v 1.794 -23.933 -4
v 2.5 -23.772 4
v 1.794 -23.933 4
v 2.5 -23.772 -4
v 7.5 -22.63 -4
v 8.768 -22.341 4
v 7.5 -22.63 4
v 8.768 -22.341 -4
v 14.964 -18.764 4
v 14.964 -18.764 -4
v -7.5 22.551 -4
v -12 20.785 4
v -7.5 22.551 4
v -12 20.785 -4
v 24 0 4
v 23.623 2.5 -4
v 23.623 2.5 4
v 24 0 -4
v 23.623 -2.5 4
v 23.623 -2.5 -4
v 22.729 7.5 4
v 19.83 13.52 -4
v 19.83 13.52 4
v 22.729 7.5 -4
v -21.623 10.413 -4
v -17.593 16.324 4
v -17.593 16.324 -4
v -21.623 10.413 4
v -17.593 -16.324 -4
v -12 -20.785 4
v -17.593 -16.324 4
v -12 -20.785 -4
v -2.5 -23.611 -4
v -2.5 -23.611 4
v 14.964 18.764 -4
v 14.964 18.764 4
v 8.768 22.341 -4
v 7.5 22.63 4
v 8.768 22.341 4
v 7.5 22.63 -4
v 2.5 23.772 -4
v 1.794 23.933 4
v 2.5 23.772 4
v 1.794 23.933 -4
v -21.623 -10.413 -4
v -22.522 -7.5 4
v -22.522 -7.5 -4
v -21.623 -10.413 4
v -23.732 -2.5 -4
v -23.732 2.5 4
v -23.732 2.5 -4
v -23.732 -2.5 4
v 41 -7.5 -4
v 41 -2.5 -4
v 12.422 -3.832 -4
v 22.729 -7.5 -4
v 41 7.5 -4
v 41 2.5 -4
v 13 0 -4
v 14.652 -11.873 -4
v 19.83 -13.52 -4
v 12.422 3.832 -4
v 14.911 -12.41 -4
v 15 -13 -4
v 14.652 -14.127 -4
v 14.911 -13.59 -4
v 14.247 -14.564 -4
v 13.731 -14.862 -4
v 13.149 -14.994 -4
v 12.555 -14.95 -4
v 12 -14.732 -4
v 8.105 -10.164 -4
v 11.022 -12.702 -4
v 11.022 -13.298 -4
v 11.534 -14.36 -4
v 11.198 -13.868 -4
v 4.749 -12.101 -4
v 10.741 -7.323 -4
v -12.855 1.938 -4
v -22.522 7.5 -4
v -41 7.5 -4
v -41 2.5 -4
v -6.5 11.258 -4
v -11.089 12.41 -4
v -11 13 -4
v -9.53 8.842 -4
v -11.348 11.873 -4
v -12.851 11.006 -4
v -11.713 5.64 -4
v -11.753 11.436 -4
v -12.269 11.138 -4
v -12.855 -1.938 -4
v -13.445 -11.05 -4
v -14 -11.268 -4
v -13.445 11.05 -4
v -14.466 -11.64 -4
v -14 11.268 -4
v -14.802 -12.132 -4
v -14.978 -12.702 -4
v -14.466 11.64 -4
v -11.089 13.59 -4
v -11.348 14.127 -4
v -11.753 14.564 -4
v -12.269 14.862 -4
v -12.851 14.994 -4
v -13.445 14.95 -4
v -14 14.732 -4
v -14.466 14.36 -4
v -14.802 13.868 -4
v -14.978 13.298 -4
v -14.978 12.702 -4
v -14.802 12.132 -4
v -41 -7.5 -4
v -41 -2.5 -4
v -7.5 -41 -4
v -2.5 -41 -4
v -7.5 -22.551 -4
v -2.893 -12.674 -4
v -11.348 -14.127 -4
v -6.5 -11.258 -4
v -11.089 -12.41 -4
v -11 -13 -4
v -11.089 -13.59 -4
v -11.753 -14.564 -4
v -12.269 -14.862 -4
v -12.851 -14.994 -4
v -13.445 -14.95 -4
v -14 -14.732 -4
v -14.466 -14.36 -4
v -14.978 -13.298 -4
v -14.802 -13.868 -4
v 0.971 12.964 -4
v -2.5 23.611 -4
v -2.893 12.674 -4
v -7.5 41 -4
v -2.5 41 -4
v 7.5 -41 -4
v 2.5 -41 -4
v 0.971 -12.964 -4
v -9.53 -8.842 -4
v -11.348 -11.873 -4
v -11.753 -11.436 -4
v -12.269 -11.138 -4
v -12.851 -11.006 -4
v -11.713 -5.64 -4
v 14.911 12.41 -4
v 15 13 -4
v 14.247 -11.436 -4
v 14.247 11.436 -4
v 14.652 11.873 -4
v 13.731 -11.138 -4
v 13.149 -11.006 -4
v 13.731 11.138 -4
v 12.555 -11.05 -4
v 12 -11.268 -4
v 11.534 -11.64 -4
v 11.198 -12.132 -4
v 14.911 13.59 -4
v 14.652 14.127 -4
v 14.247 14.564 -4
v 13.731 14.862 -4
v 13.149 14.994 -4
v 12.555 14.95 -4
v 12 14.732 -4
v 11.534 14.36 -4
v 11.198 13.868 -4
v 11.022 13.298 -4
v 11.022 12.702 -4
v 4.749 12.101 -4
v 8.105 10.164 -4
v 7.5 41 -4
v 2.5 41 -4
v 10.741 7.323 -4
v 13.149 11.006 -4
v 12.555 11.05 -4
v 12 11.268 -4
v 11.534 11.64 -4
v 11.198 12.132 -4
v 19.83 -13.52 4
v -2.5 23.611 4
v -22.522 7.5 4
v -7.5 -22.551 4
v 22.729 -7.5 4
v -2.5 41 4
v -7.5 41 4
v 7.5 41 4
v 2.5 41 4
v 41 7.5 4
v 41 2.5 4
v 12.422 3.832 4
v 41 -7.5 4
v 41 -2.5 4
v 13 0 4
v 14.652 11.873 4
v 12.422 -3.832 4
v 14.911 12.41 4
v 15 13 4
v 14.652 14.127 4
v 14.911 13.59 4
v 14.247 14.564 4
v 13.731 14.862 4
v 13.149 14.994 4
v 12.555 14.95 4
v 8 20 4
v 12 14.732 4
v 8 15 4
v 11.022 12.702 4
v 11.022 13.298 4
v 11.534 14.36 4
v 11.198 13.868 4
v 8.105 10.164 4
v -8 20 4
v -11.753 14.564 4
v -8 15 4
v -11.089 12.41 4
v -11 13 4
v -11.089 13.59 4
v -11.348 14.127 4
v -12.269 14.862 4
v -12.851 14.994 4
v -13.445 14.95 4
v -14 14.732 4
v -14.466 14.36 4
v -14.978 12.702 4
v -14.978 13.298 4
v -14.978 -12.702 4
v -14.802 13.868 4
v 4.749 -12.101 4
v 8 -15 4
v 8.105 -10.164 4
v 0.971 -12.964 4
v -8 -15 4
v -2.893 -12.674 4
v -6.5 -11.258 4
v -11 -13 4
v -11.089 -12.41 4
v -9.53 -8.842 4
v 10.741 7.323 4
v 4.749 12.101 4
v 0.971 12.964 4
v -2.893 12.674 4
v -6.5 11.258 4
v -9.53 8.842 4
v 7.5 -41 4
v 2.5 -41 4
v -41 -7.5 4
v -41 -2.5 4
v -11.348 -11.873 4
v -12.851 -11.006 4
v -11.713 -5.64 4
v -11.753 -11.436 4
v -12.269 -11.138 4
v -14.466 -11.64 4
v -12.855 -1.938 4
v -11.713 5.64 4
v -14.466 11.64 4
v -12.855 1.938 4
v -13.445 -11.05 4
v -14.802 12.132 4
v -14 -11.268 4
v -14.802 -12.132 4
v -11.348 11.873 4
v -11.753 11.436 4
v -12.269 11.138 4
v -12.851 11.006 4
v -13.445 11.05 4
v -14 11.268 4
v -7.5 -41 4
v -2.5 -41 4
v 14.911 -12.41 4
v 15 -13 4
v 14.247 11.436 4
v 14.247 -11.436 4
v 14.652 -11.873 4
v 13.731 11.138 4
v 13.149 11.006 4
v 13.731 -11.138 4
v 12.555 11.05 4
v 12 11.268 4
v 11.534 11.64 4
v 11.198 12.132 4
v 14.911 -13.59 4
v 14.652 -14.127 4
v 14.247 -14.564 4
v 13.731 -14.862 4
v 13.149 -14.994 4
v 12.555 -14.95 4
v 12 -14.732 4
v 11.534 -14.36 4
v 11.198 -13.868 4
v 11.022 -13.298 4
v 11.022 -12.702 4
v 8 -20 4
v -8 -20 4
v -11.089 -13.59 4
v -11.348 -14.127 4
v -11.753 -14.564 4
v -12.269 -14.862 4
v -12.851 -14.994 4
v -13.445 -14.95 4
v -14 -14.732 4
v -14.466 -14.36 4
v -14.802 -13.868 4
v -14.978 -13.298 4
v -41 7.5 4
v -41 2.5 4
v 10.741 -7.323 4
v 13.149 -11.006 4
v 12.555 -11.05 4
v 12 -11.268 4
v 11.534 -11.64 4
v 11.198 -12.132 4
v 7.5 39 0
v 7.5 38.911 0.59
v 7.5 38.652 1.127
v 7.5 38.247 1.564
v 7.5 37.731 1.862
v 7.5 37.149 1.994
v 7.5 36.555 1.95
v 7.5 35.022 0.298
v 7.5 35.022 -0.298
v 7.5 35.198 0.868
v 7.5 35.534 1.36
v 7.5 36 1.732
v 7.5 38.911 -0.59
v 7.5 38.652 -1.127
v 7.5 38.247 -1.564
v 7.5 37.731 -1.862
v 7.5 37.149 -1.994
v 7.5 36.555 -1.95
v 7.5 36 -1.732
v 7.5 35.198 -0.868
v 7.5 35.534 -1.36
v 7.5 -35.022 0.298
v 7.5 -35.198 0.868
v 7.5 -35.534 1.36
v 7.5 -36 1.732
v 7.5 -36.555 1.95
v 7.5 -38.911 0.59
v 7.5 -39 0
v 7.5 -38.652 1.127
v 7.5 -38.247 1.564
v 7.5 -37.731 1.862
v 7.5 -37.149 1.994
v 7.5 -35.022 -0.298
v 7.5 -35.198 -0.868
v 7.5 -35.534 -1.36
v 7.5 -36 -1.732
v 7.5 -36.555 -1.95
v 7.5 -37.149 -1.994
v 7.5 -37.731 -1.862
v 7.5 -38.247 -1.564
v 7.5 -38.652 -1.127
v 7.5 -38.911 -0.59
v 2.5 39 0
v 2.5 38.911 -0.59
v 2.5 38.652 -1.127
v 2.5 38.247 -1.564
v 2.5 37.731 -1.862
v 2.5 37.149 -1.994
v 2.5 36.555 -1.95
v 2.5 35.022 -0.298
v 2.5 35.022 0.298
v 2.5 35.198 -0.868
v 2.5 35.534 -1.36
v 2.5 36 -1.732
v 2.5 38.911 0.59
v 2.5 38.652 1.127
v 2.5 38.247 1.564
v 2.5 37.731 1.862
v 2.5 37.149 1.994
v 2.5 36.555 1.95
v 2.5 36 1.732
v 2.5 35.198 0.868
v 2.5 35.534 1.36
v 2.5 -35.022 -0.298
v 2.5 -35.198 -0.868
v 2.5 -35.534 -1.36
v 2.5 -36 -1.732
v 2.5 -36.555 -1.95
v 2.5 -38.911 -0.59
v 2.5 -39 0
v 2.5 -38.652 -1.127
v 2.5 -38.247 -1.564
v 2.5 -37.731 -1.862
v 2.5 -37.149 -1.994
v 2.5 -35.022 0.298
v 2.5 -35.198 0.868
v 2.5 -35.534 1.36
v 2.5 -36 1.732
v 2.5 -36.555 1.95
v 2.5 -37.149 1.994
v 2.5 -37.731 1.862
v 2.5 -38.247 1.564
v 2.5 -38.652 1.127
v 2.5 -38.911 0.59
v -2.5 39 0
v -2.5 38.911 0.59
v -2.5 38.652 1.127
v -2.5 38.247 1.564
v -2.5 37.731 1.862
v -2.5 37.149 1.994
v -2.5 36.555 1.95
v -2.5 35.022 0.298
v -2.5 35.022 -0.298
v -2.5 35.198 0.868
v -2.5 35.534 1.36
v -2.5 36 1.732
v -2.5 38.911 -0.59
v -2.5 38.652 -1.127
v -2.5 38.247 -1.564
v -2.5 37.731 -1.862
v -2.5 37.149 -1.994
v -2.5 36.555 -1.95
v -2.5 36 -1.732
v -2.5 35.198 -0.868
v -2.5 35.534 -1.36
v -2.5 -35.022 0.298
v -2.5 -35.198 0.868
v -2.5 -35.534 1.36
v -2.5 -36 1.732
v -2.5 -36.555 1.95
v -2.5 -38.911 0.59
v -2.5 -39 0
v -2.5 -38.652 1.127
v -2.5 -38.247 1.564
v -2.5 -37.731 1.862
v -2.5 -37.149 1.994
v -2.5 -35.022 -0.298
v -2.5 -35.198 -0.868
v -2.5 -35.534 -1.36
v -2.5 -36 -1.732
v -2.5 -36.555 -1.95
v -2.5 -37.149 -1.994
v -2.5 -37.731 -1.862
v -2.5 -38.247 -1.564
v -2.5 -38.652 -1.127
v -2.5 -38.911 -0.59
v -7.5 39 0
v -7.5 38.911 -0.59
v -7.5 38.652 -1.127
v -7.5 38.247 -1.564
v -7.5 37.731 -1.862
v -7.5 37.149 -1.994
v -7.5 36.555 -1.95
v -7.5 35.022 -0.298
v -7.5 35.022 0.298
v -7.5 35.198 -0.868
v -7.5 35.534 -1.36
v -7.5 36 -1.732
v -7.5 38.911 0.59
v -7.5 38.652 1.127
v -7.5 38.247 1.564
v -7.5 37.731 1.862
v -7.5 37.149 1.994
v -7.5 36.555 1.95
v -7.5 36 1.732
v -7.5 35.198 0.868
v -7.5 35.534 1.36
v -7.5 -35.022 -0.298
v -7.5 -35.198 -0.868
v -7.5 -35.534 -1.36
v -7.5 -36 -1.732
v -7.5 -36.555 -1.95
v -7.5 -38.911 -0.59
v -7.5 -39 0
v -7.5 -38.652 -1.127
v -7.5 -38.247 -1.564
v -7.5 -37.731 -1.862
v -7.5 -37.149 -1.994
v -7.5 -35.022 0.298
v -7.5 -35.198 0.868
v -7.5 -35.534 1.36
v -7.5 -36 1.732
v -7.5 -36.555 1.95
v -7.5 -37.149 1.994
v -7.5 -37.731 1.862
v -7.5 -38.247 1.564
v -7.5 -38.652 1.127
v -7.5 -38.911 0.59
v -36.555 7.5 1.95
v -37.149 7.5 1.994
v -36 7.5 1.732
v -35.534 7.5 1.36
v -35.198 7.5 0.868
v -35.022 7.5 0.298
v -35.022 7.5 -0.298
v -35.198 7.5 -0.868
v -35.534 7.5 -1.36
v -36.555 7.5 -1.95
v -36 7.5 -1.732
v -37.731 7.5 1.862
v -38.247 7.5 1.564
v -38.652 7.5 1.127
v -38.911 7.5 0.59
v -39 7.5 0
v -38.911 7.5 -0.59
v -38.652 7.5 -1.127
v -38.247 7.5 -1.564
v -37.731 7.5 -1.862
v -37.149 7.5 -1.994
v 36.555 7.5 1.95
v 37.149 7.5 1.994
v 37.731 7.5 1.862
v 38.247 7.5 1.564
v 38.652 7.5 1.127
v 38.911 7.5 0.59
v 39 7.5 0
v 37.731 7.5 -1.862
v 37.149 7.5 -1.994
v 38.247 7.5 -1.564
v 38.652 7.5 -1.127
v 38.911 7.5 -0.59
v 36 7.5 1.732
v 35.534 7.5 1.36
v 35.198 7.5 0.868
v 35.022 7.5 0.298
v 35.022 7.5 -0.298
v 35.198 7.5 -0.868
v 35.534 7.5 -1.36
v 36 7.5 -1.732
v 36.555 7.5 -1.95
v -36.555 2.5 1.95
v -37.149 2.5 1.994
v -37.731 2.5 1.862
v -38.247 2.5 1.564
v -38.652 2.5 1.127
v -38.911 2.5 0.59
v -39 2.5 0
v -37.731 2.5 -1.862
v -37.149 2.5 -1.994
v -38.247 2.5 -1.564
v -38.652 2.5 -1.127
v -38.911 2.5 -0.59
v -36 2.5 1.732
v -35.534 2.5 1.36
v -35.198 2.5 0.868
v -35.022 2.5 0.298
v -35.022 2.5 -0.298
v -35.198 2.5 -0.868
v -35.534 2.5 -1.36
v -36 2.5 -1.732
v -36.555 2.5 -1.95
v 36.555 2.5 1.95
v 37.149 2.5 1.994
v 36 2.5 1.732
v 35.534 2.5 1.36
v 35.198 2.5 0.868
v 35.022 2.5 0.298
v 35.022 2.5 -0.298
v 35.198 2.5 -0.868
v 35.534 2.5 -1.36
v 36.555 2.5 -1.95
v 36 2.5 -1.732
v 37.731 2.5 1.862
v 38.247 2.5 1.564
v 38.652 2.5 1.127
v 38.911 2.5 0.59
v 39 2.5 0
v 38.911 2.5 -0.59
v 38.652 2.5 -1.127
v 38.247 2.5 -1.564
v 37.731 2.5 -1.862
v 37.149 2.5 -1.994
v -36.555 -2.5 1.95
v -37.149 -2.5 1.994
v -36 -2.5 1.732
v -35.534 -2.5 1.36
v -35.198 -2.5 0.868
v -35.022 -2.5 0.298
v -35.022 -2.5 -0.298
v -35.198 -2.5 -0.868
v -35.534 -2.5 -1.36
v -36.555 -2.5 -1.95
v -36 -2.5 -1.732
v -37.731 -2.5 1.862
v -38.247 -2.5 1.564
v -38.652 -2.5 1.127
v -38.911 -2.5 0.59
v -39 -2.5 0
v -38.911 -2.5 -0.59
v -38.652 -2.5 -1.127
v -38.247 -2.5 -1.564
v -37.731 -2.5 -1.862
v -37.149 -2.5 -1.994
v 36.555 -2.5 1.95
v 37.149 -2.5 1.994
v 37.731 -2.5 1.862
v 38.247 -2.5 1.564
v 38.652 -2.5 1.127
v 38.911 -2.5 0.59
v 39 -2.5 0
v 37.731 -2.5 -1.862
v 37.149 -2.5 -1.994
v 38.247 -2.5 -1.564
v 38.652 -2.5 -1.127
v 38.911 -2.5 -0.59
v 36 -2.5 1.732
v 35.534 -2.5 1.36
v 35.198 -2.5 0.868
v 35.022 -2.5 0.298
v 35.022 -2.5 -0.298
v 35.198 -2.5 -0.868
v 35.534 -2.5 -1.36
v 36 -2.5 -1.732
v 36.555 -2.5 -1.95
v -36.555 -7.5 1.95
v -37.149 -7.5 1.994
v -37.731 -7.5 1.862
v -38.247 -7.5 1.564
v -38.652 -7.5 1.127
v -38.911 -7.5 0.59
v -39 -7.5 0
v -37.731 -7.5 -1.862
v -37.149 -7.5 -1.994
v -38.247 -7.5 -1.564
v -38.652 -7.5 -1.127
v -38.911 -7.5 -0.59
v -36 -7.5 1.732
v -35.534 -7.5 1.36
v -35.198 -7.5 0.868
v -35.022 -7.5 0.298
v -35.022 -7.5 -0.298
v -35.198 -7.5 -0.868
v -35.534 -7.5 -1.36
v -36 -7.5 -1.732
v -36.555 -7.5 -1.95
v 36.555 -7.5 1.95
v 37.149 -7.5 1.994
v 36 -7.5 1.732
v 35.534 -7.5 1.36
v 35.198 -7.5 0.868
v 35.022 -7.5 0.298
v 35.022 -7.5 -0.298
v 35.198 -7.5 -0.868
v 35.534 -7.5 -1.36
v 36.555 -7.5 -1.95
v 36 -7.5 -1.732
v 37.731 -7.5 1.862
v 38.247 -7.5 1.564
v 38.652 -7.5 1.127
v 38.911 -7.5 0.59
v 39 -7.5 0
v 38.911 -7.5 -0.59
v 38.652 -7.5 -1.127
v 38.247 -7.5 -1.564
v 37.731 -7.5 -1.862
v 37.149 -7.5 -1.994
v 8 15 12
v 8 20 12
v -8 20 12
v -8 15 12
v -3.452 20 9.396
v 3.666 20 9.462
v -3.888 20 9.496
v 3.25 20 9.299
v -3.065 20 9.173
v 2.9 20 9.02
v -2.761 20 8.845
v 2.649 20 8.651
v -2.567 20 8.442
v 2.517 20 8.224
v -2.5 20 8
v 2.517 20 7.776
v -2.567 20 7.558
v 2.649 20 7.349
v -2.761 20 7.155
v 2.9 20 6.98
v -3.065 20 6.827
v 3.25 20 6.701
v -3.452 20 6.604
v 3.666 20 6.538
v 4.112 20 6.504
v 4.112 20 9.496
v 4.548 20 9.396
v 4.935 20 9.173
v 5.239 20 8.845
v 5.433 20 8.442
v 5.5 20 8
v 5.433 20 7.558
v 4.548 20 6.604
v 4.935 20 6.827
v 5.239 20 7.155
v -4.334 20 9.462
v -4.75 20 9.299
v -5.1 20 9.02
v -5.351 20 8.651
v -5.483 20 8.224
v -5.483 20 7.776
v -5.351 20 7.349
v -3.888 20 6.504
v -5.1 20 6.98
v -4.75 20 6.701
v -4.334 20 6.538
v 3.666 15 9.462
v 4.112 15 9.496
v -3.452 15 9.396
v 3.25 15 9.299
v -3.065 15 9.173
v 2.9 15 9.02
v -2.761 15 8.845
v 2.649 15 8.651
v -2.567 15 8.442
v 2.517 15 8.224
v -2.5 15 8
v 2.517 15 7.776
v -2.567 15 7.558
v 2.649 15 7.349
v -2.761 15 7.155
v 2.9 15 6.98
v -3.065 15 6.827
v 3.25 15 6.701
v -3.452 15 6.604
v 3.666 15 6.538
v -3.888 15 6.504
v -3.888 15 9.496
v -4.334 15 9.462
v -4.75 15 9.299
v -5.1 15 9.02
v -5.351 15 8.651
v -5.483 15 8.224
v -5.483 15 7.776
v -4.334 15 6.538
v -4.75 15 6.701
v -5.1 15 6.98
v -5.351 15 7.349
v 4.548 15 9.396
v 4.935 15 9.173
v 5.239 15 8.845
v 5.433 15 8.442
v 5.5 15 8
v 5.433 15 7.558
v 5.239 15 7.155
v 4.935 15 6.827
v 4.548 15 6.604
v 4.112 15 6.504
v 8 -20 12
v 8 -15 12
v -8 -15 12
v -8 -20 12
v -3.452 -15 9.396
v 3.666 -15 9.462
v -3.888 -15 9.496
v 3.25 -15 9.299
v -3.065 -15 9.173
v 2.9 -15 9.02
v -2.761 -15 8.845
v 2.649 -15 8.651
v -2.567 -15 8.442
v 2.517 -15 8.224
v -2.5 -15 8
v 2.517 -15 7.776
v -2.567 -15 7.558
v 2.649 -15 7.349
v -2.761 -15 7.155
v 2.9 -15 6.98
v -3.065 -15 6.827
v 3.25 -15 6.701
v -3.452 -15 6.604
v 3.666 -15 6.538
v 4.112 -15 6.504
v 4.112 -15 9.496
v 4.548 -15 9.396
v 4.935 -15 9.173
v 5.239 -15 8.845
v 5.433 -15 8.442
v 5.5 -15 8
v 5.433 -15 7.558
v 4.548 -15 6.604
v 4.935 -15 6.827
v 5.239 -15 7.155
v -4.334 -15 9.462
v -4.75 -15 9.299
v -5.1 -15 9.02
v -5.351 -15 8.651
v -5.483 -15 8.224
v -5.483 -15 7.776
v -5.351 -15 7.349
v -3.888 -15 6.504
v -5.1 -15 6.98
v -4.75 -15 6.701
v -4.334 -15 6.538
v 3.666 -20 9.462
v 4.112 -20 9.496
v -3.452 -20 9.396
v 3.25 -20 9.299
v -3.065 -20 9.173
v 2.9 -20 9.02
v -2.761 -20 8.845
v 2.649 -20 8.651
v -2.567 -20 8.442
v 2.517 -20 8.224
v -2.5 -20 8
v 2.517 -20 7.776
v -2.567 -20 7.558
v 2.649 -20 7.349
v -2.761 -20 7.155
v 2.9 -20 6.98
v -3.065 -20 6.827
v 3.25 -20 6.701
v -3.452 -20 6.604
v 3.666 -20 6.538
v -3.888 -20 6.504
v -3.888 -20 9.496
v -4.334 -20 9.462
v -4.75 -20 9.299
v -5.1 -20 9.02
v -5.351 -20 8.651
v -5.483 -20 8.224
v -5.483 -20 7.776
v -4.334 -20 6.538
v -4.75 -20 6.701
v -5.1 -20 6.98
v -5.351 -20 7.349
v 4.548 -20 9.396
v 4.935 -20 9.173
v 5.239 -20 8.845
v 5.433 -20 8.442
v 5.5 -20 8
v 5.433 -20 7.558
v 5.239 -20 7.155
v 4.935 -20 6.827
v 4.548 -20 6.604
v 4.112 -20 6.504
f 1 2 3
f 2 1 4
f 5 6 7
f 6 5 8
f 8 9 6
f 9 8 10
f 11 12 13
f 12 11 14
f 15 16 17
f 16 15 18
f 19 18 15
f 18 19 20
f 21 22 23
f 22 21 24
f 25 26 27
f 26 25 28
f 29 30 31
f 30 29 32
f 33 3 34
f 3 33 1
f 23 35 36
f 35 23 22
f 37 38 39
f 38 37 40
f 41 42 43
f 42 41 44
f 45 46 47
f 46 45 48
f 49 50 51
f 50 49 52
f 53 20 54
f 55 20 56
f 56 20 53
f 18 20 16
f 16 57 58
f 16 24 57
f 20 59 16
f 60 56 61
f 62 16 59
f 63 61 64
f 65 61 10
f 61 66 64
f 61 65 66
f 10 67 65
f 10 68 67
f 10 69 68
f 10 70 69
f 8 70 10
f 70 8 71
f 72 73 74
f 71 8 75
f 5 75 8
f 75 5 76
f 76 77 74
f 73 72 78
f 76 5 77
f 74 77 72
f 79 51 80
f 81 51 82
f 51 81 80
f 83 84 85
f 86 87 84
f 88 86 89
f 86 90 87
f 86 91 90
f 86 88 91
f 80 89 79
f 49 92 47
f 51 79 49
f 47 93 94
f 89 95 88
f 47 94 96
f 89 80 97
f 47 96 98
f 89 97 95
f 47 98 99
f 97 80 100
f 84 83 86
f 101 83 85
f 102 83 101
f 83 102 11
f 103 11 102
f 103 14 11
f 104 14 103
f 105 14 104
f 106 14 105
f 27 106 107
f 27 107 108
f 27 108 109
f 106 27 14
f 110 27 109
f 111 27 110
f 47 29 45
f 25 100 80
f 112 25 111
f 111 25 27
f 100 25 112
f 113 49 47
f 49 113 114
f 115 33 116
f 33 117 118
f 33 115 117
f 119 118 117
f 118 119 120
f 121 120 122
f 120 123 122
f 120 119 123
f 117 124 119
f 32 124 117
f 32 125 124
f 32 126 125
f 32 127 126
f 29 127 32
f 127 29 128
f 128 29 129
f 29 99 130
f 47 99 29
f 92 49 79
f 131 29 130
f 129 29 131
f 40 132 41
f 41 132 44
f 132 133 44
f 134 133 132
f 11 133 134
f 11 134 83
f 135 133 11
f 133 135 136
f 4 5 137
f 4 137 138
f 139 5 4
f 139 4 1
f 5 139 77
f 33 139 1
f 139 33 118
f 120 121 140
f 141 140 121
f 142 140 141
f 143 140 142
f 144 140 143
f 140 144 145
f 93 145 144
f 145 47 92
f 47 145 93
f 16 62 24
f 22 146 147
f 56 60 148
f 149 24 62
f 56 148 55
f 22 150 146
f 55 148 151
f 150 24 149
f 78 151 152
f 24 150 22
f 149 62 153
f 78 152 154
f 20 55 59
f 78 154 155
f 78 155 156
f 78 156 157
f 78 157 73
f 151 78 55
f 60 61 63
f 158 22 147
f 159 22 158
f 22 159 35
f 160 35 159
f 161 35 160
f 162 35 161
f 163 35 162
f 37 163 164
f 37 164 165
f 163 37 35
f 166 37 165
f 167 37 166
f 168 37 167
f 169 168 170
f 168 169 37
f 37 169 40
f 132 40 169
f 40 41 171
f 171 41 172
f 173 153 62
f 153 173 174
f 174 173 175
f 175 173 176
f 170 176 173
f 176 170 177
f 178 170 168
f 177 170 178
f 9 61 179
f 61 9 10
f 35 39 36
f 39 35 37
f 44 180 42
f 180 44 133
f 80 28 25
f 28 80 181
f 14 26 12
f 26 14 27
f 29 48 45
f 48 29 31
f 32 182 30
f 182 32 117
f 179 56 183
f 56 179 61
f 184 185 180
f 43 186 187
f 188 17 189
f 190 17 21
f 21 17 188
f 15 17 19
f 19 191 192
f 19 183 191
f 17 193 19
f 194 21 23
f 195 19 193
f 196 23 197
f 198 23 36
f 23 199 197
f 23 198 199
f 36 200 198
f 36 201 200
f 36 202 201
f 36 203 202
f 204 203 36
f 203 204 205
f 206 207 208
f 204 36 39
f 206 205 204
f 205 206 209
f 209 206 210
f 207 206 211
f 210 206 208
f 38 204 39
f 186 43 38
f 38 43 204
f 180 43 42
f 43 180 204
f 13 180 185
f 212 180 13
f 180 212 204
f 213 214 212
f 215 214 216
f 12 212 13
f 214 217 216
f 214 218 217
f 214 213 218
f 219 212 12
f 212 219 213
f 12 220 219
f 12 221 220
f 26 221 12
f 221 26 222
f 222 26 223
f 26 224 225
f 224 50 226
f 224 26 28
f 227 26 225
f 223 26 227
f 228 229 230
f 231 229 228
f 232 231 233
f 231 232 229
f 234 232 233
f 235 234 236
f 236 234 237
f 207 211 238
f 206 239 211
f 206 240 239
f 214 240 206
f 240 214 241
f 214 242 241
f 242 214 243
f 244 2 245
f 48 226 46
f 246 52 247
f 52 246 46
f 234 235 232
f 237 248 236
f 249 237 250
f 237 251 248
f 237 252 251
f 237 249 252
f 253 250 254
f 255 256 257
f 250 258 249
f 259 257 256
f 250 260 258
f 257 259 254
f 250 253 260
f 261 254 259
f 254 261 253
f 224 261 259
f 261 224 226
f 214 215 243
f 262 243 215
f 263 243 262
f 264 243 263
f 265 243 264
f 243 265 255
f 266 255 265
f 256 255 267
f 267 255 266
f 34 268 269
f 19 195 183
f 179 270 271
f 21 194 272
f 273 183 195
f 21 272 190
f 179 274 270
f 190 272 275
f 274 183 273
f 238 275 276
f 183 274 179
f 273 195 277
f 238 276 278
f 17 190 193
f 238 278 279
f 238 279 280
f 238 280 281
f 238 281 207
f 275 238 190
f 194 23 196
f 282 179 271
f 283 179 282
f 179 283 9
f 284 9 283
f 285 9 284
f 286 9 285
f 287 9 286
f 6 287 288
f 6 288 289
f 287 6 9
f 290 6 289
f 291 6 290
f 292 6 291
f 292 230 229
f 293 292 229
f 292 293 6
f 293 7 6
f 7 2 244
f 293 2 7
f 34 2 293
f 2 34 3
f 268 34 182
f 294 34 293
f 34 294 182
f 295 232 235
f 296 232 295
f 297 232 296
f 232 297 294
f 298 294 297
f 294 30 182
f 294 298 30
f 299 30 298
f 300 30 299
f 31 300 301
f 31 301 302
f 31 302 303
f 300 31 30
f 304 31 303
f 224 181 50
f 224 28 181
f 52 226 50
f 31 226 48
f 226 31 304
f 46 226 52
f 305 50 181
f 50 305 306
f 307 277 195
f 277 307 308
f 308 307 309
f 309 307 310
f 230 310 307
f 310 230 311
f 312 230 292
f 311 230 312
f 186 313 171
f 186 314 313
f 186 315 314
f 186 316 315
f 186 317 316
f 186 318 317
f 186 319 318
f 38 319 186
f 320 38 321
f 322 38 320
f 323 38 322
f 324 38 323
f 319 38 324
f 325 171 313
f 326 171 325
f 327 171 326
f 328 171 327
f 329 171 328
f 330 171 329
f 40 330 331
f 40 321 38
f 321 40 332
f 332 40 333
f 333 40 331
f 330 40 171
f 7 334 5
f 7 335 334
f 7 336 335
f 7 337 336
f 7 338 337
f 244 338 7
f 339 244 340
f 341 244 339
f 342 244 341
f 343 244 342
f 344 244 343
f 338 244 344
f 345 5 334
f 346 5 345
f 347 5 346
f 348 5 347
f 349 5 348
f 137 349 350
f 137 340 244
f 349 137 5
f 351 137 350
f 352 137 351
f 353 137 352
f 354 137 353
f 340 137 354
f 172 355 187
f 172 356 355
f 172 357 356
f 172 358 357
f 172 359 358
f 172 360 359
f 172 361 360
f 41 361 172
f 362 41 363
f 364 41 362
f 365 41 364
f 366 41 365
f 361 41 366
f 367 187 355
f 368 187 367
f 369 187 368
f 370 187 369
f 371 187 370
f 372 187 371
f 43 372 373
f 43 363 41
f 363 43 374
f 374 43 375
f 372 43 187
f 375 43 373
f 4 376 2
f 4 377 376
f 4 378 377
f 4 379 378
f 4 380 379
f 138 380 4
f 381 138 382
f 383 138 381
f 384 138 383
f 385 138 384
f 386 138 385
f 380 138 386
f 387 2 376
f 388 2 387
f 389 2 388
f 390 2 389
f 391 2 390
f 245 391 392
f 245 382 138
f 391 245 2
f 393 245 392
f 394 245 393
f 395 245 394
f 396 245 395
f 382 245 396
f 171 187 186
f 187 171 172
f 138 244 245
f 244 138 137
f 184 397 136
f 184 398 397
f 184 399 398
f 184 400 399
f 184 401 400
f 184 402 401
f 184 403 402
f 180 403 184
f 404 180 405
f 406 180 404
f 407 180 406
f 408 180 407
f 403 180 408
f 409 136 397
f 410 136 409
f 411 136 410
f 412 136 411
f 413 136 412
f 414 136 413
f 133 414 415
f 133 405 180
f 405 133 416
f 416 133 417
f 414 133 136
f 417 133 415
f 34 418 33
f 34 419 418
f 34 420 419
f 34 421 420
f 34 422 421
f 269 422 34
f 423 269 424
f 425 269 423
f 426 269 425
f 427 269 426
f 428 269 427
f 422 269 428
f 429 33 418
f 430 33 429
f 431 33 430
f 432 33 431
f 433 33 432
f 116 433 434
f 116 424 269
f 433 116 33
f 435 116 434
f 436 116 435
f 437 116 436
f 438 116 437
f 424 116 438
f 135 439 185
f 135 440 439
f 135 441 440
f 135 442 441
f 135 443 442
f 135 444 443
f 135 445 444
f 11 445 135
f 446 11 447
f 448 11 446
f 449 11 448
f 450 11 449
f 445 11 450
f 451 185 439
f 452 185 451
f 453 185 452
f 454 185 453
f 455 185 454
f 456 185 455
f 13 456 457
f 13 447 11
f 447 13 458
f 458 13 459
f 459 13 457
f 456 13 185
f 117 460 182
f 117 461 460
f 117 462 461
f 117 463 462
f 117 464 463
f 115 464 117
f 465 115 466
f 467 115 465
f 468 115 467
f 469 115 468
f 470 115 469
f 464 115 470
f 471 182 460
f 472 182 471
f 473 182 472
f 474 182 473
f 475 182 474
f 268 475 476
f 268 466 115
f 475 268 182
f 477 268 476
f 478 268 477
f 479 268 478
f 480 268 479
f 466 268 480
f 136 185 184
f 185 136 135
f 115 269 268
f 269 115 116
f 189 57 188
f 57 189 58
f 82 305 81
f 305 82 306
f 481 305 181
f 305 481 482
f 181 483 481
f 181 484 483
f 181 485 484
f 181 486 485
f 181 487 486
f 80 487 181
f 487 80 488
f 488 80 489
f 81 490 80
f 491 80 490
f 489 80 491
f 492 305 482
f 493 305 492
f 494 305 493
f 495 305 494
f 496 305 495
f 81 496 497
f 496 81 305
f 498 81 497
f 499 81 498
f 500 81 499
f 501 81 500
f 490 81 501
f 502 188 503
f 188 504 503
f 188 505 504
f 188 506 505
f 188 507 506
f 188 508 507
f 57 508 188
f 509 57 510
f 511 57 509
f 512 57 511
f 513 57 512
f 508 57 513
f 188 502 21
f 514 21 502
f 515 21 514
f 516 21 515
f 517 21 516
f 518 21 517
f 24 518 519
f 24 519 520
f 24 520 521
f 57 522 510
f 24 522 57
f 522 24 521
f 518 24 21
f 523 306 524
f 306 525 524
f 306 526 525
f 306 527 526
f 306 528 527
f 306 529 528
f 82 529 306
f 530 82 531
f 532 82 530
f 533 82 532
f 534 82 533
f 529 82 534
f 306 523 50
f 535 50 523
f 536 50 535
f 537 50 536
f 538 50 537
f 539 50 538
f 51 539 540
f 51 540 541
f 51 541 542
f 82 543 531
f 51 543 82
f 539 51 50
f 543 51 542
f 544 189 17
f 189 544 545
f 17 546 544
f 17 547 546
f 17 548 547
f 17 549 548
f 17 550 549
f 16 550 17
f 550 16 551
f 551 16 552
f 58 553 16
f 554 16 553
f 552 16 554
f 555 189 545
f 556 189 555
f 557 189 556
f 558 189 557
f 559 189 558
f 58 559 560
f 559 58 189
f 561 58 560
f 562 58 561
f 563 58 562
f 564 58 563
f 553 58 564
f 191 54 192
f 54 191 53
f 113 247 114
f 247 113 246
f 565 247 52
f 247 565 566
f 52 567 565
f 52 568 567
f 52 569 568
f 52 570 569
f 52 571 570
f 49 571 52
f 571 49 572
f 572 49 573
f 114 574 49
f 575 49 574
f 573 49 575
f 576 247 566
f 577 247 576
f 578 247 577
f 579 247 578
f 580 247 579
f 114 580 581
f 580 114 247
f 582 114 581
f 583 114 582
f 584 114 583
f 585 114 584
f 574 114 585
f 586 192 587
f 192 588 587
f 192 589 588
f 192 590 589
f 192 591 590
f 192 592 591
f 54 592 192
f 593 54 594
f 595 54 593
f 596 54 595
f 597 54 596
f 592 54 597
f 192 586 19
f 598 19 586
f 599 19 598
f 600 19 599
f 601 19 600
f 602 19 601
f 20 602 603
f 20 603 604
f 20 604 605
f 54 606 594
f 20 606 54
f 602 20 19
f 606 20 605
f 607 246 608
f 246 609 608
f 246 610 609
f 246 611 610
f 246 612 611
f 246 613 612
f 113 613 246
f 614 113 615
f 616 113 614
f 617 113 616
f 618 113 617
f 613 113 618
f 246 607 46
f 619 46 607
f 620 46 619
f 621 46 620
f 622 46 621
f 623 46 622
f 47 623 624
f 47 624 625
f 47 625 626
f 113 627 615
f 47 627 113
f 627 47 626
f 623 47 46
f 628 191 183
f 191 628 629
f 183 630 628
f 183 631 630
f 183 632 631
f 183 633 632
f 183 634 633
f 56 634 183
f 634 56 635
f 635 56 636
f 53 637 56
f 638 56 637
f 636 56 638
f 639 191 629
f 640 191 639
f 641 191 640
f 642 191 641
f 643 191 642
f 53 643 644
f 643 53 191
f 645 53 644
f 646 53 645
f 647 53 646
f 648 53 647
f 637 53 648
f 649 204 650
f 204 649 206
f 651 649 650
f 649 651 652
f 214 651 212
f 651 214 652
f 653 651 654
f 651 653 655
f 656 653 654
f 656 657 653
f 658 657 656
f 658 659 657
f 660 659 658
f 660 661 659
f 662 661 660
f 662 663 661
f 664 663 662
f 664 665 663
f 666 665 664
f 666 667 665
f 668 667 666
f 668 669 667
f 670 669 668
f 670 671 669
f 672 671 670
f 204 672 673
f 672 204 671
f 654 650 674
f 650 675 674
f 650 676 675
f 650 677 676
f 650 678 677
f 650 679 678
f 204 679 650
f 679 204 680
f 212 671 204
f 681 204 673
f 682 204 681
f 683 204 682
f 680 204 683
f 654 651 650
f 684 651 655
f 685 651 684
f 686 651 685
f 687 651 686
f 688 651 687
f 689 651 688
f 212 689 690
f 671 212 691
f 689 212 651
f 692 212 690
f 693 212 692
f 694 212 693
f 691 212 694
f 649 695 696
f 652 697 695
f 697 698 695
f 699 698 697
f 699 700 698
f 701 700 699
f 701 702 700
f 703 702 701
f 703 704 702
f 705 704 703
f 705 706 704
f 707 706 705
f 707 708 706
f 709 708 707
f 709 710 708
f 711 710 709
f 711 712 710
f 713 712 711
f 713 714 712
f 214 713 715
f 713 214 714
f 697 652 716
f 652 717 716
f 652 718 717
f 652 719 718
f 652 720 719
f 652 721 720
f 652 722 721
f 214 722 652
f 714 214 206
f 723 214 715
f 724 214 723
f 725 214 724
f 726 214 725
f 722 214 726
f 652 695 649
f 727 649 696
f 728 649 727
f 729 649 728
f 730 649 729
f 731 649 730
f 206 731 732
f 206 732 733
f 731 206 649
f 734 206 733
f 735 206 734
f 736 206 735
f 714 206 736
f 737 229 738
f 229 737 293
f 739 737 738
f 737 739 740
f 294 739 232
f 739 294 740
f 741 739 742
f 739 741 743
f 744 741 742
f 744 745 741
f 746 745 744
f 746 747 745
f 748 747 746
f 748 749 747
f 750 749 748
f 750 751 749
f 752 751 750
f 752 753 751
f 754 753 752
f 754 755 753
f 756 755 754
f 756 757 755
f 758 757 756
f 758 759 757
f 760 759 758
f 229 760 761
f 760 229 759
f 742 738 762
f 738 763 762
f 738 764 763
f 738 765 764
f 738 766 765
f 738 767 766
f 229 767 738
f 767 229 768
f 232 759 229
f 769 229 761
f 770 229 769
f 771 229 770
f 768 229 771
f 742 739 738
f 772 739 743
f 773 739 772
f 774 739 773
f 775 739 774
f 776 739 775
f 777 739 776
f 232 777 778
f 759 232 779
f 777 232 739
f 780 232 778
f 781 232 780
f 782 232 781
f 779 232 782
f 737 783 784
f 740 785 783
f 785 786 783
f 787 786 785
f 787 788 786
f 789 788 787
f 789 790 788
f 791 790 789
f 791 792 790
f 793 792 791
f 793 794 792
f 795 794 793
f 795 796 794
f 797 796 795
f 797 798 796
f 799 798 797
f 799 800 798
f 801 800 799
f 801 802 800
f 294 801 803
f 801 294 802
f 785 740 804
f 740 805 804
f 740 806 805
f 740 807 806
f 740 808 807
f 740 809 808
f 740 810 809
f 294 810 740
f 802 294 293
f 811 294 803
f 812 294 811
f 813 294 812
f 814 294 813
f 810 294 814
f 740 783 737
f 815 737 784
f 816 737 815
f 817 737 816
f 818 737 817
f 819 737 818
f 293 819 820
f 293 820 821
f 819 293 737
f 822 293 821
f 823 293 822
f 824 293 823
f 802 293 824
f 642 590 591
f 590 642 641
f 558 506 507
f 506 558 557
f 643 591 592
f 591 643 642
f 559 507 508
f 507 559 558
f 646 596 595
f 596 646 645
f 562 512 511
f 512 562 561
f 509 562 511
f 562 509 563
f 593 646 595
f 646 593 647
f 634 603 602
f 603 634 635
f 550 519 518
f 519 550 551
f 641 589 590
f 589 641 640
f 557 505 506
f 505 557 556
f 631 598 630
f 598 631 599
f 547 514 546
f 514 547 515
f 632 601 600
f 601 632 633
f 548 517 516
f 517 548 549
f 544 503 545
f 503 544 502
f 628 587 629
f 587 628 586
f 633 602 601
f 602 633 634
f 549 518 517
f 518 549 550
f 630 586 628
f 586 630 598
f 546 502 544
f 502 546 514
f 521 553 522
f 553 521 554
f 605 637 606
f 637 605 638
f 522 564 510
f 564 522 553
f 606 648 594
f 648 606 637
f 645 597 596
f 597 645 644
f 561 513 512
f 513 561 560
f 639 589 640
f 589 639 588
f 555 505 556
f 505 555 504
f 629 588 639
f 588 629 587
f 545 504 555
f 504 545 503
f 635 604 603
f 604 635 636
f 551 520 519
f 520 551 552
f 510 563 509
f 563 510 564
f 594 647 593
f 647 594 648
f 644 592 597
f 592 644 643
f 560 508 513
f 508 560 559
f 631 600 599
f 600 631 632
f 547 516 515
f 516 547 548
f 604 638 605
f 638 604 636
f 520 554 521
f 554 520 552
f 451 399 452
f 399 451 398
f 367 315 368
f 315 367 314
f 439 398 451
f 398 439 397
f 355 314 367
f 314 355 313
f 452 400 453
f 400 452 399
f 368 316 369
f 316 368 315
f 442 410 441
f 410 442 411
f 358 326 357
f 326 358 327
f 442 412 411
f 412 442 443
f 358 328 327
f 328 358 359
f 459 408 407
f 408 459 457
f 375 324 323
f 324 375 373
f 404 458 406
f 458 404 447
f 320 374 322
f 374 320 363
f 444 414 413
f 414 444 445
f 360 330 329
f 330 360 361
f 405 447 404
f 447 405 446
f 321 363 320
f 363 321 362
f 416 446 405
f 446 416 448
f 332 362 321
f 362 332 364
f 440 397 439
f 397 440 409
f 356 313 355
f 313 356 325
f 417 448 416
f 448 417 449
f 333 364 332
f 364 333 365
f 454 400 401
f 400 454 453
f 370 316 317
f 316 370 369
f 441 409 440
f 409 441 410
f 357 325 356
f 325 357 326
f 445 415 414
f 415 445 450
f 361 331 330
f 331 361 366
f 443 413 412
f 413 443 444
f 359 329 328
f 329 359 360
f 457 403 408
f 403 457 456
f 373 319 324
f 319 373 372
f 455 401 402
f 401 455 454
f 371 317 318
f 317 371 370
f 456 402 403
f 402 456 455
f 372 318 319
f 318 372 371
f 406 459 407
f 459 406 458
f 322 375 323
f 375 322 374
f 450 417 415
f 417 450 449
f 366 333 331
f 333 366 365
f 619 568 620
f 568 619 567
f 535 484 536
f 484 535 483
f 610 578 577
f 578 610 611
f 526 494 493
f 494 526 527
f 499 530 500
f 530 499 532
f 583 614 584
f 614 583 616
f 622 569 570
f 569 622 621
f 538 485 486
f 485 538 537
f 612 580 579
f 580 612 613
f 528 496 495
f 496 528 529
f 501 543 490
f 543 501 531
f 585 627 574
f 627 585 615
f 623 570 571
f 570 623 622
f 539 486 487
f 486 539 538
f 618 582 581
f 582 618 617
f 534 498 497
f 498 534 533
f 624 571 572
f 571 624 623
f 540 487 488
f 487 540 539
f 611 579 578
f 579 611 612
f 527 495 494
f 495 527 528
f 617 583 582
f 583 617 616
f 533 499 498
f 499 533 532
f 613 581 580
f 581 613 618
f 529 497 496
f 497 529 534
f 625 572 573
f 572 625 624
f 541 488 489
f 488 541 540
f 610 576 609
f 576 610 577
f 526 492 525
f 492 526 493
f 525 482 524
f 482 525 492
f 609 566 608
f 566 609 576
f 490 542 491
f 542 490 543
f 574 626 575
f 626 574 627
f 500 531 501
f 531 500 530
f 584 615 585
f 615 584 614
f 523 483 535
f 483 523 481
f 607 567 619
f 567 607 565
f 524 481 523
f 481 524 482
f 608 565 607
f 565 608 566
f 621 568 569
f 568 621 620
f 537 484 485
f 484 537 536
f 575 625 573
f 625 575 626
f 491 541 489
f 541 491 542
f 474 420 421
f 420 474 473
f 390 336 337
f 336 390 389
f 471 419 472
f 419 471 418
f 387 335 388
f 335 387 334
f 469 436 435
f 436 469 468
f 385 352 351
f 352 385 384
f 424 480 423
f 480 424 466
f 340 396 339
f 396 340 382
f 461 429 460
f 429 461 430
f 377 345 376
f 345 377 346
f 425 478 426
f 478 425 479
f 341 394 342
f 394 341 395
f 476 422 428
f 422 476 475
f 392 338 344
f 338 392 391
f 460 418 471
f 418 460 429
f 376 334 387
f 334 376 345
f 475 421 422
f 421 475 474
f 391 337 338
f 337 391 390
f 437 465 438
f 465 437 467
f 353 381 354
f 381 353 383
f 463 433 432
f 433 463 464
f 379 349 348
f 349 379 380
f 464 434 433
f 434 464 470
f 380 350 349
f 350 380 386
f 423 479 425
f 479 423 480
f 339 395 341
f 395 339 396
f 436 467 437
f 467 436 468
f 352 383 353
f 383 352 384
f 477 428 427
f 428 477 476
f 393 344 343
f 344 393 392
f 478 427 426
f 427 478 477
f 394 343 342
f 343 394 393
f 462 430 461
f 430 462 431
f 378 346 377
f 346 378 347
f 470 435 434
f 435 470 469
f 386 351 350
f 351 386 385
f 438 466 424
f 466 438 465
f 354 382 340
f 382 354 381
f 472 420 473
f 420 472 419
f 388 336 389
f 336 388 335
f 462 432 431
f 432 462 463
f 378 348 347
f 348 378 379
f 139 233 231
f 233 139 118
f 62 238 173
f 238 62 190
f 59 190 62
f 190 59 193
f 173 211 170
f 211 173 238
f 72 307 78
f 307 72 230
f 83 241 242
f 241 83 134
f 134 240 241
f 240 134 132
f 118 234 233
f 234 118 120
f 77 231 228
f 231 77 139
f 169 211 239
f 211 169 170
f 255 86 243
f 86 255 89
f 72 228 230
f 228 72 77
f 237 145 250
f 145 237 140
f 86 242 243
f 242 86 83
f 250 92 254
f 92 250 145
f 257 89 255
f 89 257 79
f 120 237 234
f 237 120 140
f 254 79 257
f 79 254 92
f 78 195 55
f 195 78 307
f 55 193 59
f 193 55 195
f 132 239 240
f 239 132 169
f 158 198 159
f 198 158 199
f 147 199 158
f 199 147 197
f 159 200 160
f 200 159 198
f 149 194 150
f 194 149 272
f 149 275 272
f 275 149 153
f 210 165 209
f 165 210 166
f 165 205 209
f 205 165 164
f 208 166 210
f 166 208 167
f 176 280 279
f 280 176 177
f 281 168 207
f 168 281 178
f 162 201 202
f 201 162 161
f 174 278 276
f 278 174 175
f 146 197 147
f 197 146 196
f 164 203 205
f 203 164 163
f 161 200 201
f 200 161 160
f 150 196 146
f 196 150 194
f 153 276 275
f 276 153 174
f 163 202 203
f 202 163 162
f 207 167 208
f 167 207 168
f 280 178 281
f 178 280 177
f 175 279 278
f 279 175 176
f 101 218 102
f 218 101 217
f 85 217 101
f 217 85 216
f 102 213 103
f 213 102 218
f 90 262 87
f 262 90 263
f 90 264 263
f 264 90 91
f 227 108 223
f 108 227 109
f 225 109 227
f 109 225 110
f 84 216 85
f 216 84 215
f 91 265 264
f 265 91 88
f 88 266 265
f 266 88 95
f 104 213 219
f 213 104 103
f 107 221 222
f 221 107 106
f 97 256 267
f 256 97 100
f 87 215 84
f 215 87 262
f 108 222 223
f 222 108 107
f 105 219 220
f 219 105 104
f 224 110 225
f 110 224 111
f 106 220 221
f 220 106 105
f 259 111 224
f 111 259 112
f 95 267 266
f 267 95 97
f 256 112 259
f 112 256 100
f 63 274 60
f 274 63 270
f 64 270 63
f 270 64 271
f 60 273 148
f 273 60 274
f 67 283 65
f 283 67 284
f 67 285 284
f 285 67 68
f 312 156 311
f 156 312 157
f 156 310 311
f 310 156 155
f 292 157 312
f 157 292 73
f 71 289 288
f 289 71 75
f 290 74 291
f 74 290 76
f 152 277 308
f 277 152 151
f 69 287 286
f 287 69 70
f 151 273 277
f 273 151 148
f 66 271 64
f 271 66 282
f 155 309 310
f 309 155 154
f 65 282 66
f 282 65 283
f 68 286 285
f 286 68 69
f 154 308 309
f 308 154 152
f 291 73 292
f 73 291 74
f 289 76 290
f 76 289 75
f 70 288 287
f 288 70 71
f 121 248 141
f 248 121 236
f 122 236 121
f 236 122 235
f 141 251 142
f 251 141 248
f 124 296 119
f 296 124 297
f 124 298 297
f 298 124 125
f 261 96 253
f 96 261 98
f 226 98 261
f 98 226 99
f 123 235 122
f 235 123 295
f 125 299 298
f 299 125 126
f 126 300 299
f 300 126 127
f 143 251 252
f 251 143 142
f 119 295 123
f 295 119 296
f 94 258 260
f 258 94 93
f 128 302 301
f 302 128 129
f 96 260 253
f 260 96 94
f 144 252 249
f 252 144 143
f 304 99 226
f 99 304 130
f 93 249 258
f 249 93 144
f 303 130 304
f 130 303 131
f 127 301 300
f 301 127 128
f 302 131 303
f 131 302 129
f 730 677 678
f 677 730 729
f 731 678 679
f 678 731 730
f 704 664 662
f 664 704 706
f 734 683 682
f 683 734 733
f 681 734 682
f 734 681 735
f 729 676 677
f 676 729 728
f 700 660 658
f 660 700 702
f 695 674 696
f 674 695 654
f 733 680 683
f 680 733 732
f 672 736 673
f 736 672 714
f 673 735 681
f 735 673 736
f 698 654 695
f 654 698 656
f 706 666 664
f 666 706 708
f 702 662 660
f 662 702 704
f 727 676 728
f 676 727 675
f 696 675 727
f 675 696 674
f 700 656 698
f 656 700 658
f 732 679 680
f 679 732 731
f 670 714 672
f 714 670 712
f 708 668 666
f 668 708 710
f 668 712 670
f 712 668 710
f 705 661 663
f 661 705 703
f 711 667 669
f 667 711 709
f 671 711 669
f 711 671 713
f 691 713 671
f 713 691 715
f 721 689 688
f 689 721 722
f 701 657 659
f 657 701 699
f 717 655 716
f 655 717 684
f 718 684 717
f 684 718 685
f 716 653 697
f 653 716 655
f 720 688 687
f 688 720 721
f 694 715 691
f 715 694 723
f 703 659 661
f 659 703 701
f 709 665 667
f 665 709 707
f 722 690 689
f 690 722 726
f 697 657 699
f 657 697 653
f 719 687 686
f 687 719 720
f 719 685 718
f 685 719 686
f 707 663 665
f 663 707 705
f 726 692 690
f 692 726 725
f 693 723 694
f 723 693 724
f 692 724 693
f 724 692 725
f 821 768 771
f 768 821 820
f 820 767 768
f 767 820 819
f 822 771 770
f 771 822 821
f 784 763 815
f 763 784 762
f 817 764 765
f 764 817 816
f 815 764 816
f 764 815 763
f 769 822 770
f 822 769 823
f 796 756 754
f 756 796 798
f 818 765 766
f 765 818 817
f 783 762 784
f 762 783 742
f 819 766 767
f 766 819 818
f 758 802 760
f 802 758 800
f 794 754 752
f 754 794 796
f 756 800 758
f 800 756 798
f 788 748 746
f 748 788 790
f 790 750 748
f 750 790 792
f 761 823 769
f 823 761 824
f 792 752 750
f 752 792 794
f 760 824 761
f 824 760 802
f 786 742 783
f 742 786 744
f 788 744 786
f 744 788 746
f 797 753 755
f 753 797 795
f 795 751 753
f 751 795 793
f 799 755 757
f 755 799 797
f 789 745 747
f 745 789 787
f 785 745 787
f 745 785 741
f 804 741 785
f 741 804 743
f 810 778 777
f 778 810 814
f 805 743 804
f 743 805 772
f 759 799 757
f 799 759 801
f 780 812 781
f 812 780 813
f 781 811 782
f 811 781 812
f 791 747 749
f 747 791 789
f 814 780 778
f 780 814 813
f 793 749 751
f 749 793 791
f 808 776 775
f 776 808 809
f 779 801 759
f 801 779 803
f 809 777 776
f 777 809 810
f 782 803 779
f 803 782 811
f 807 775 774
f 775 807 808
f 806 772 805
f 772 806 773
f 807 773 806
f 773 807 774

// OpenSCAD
$fn = 21;
difference(){
	union(){	
		translate([0,0,0])cylinder(r = 24, h = 8,center=true);
		translate([5,0,0])cube([5,64+18,8],center=true);
		translate([-5,0,0])cube([5,64+18,8],center=true);
		translate([0,5,0])cube([64+18,5,8],center=true);
		translate([0,-5,0])cube([64+18,5,8],center=true);
		
		translate([-8,15,0])cube([16,5,12]);
		translate([-8,-5-15,0])cube([16,5,12]);
		
	}
	translate([0,0,0])cylinder(r = 13, h = 9,center=true);
	translate([13,13,0])cylinder(r = 2, h = 9,center=true);
	translate([-13,13,0])cylinder(r = 2, h = 9,center=true);
	translate([13,-13,0])cylinder(r = 2, h = 9,center=true);
	translate([-13,-13,0])cylinder(r = 2, h = 9,center=true);
	for(i = [0:90:360]){
		rotate([90,0,i])translate([32+5,0,0])cylinder(r=2, h = 17,center = true);
	}

	translate([4,21,8])rotate([90,0,0])cylinder(r = 1.5, h = 9);
	translate([-4,21,8])rotate([90,0,0])cylinder(r = 1.5, h = 9);
	translate([4,-21,8])rotate([-90,0,0])cylinder(r = 1.5, h = 9);
	translate([-4,-21,8])rotate([-90,0,0])cylinder(r = 1.5, h = 9);
}
